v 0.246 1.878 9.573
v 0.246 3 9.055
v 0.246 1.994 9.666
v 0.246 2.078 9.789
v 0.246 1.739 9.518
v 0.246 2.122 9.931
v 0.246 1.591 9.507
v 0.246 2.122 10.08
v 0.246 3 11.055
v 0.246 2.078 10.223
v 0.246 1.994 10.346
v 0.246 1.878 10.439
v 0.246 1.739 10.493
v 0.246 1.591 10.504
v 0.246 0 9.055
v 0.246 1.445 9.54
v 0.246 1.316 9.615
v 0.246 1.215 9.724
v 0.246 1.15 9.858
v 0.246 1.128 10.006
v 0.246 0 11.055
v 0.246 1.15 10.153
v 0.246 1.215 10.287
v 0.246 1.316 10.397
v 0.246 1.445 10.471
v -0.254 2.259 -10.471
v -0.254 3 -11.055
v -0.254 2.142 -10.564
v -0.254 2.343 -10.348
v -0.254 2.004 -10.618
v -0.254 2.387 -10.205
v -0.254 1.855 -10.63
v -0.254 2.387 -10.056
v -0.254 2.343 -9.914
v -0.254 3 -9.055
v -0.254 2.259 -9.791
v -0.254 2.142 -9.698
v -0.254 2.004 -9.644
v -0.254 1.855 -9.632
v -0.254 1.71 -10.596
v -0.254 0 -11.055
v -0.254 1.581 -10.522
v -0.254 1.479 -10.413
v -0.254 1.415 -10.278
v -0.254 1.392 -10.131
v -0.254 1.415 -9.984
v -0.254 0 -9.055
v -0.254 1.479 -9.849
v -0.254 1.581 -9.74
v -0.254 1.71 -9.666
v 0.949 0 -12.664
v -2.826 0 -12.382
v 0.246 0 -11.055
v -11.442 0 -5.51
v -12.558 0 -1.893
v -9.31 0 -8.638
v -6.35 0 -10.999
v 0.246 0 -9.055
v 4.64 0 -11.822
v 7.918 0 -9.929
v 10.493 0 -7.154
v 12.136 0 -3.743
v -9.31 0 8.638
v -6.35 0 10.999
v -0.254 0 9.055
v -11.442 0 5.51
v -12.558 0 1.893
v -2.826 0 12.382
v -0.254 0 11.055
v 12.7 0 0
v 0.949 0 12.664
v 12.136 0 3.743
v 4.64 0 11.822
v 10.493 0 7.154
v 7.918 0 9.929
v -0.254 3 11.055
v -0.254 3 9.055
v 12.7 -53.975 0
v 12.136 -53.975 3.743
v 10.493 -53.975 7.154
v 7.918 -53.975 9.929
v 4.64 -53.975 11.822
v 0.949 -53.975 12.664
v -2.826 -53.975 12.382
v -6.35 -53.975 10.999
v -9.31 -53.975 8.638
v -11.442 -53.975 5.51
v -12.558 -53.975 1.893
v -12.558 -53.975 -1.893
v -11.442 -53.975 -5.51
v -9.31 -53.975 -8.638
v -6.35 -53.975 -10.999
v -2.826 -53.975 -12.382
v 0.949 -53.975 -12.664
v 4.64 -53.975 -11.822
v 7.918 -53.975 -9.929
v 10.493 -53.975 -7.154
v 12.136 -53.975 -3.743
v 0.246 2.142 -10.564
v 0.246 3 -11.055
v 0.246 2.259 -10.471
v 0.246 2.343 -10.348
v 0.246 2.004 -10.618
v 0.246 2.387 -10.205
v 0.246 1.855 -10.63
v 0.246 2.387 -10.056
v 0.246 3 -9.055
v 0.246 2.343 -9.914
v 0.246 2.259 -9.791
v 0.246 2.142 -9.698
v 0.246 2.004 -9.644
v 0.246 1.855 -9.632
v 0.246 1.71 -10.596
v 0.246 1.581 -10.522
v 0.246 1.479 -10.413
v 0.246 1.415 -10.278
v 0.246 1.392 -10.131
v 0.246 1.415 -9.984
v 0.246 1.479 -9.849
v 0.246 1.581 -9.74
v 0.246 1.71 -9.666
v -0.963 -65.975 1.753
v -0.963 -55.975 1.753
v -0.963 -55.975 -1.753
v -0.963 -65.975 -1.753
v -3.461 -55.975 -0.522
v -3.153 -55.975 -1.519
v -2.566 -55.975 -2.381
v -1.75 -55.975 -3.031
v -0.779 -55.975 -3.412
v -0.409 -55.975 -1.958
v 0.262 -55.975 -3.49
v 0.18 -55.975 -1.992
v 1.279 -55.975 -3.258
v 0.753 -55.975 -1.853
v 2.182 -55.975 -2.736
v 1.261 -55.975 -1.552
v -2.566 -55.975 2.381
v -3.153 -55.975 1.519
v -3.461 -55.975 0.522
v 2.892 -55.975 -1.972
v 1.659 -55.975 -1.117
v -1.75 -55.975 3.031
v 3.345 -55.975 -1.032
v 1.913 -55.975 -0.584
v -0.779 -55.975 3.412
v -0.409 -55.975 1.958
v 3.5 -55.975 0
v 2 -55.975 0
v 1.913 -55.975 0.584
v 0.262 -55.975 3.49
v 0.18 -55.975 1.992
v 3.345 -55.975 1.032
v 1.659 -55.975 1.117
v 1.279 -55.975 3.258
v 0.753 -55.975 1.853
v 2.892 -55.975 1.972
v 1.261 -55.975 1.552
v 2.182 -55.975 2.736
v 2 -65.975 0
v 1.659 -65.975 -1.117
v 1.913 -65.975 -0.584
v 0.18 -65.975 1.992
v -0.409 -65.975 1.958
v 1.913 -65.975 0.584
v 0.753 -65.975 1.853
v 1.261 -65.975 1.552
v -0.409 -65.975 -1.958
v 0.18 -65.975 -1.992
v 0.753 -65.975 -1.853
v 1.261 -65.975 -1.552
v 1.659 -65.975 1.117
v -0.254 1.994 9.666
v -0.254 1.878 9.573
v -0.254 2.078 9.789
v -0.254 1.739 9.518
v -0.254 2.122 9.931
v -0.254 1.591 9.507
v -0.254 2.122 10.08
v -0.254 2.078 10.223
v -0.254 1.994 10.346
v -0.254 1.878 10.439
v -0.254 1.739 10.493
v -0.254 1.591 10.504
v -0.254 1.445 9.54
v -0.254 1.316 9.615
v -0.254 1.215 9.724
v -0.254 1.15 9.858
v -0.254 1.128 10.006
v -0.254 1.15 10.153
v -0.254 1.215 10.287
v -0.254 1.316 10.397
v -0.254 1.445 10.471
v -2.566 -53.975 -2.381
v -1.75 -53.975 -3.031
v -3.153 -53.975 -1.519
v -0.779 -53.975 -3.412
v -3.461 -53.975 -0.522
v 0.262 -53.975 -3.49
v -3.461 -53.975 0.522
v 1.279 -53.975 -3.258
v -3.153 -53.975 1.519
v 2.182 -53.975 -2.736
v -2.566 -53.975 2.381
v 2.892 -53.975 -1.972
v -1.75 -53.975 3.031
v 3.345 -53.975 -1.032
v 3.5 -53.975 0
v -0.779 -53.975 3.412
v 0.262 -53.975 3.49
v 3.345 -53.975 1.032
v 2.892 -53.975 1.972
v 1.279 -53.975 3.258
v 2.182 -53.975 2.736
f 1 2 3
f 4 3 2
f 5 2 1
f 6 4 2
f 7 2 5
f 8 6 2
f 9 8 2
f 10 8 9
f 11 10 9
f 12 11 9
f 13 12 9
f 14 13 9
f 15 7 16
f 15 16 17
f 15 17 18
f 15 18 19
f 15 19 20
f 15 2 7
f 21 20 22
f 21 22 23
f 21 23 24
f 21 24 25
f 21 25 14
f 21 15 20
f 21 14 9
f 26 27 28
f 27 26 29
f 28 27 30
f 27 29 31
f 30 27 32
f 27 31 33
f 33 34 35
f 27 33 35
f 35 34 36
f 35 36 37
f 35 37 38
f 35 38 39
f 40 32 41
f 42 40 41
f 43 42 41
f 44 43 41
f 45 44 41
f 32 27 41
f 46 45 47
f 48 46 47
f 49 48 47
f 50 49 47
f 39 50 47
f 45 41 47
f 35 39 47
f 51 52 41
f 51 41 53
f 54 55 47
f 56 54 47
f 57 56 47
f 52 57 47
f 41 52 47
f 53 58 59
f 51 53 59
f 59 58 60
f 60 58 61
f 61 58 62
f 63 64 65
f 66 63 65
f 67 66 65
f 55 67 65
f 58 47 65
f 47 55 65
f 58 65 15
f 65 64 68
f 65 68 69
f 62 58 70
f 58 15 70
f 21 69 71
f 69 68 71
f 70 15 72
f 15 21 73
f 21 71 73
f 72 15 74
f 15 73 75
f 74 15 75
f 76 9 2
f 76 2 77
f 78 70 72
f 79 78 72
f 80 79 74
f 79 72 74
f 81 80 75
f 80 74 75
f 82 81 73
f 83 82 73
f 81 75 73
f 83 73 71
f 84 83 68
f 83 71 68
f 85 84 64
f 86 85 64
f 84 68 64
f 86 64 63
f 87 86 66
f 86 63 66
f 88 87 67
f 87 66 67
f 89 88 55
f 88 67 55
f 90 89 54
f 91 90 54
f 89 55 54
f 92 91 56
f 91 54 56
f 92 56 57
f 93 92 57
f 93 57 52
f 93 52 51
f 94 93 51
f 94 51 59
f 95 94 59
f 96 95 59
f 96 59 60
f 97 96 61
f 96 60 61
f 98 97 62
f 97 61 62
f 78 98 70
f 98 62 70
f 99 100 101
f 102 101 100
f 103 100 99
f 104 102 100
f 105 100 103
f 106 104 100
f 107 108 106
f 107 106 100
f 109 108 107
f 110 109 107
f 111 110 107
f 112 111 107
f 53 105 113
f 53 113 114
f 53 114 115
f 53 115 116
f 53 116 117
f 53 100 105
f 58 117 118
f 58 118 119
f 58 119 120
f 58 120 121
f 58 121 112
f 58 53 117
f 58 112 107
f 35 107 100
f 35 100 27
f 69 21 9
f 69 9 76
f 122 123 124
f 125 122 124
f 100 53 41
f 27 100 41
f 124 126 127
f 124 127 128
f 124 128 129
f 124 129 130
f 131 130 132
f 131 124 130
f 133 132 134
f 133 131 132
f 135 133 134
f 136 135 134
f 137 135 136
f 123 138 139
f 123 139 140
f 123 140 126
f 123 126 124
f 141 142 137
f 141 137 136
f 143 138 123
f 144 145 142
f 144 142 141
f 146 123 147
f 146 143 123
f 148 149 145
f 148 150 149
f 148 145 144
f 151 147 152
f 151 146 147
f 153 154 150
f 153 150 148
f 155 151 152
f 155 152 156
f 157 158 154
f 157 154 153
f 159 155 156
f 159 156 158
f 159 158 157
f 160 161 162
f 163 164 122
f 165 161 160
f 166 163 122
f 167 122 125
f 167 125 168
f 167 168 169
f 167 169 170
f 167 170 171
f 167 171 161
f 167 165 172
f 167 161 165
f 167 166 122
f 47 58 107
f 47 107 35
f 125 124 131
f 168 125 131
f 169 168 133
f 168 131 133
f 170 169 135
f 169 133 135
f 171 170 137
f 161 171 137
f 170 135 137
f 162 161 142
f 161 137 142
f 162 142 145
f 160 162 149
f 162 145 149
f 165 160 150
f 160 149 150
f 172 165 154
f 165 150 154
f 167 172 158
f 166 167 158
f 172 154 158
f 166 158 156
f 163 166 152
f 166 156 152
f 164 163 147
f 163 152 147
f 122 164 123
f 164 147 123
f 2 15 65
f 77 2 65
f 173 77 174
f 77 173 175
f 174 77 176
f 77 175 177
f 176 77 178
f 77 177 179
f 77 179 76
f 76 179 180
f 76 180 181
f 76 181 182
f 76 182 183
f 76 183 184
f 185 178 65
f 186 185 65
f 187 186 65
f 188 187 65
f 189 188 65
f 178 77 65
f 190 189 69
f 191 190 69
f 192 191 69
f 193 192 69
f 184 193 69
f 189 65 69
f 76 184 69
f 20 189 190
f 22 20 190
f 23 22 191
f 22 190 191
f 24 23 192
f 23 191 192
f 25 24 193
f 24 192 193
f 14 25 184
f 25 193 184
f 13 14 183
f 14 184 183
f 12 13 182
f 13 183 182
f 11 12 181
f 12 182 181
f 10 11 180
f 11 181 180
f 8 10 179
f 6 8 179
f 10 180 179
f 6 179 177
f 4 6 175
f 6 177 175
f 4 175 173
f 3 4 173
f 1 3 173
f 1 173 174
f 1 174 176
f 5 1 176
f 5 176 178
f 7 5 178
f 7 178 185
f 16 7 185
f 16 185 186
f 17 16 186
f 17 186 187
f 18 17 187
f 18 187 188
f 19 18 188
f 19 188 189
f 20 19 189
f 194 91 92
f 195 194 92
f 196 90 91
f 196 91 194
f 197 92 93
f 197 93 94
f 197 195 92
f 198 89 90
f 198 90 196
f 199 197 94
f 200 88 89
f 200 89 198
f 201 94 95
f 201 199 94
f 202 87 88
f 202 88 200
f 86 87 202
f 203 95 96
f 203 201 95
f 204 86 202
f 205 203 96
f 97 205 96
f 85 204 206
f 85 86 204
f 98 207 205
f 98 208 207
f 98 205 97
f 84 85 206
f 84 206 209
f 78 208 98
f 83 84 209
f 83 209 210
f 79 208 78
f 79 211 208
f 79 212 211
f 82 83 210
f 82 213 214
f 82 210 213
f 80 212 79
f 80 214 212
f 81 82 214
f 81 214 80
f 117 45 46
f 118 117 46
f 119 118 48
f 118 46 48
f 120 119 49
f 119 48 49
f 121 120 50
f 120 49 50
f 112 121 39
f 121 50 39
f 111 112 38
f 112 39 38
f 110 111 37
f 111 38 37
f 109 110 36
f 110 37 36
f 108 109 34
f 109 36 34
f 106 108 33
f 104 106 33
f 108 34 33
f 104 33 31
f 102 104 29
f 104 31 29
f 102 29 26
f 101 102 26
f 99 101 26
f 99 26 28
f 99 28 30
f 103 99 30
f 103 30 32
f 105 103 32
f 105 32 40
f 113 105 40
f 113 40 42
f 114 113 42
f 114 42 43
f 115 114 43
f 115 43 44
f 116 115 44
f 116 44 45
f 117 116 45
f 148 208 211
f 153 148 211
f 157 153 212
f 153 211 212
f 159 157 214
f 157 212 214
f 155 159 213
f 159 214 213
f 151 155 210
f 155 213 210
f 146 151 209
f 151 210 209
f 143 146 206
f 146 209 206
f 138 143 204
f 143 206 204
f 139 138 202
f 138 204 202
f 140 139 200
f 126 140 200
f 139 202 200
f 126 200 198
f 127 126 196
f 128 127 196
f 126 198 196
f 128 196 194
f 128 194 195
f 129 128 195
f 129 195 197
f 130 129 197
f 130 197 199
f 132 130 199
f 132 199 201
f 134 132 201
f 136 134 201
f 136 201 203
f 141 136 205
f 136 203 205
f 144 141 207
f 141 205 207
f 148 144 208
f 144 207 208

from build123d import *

# Parameters (mm, degrees)
F0_R     = 12.7
F1_DEPTH = 53.975
F2_R     = 3.5
F3_DEPTH = 2
F5_DEPTH = 10
F6_W     = 0.5
F6_H     = 2
F7_DEPTH = 3
F8_R     = 0.5
F9_DEPTH = 25.4


with BuildPart() as f1:
    # F0 (on Front) → F1 (new body)
    with BuildSketch(Plane.XZ):
        Circle(F0_R)
    extrude(amount=F1_DEPTH)

    # F2 (on face) → F3 (join)
    with BuildSketch(Plane.XZ.offset(53.975)):
        Circle(F2_R)
    extrude(amount=F3_DEPTH)

    # F4 (on face) → F5 (join)
    with BuildSketch(Plane.XZ.offset(55.975)):
        with BuildLine():
            Line((-0.962927, 1.752932), (-0.962927, -1.752932))
            ThreePointArc((-0.962927, -1.752932), (2, 0), (-0.962927, 1.752932))
        make_face()
    extrude(amount=F5_DEPTH)

    # F6 (on face) → F7 (join)
    with BuildSketch(Plane(origin=(0, 0, 0), x_dir=(-1, 0, 0), z_dir=(0, 1, 0))):
        with Locations((0.004237, 10.055495)):
            Rectangle(F6_W, F6_H)
        with Locations((0.004237, -10.055495)):
            Rectangle(F6_W, F6_H)
    extrude(amount=F7_DEPTH)

    # F8 (on face) → F9 (cut)
    with BuildSketch(Plane(origin=(-0.254237, 0, 0), x_dir=(0, -1, 0), z_dir=(-1, 0, 0))):
        with Locations((-1.627872, 10.00566)):
            Circle(F8_R)
        with Locations((-1.892378, -10.130965)):
            Circle(F8_R)
    extrude(amount=-F9_DEPTH, mode=Mode.SUBTRACT)


solid = f1.part
